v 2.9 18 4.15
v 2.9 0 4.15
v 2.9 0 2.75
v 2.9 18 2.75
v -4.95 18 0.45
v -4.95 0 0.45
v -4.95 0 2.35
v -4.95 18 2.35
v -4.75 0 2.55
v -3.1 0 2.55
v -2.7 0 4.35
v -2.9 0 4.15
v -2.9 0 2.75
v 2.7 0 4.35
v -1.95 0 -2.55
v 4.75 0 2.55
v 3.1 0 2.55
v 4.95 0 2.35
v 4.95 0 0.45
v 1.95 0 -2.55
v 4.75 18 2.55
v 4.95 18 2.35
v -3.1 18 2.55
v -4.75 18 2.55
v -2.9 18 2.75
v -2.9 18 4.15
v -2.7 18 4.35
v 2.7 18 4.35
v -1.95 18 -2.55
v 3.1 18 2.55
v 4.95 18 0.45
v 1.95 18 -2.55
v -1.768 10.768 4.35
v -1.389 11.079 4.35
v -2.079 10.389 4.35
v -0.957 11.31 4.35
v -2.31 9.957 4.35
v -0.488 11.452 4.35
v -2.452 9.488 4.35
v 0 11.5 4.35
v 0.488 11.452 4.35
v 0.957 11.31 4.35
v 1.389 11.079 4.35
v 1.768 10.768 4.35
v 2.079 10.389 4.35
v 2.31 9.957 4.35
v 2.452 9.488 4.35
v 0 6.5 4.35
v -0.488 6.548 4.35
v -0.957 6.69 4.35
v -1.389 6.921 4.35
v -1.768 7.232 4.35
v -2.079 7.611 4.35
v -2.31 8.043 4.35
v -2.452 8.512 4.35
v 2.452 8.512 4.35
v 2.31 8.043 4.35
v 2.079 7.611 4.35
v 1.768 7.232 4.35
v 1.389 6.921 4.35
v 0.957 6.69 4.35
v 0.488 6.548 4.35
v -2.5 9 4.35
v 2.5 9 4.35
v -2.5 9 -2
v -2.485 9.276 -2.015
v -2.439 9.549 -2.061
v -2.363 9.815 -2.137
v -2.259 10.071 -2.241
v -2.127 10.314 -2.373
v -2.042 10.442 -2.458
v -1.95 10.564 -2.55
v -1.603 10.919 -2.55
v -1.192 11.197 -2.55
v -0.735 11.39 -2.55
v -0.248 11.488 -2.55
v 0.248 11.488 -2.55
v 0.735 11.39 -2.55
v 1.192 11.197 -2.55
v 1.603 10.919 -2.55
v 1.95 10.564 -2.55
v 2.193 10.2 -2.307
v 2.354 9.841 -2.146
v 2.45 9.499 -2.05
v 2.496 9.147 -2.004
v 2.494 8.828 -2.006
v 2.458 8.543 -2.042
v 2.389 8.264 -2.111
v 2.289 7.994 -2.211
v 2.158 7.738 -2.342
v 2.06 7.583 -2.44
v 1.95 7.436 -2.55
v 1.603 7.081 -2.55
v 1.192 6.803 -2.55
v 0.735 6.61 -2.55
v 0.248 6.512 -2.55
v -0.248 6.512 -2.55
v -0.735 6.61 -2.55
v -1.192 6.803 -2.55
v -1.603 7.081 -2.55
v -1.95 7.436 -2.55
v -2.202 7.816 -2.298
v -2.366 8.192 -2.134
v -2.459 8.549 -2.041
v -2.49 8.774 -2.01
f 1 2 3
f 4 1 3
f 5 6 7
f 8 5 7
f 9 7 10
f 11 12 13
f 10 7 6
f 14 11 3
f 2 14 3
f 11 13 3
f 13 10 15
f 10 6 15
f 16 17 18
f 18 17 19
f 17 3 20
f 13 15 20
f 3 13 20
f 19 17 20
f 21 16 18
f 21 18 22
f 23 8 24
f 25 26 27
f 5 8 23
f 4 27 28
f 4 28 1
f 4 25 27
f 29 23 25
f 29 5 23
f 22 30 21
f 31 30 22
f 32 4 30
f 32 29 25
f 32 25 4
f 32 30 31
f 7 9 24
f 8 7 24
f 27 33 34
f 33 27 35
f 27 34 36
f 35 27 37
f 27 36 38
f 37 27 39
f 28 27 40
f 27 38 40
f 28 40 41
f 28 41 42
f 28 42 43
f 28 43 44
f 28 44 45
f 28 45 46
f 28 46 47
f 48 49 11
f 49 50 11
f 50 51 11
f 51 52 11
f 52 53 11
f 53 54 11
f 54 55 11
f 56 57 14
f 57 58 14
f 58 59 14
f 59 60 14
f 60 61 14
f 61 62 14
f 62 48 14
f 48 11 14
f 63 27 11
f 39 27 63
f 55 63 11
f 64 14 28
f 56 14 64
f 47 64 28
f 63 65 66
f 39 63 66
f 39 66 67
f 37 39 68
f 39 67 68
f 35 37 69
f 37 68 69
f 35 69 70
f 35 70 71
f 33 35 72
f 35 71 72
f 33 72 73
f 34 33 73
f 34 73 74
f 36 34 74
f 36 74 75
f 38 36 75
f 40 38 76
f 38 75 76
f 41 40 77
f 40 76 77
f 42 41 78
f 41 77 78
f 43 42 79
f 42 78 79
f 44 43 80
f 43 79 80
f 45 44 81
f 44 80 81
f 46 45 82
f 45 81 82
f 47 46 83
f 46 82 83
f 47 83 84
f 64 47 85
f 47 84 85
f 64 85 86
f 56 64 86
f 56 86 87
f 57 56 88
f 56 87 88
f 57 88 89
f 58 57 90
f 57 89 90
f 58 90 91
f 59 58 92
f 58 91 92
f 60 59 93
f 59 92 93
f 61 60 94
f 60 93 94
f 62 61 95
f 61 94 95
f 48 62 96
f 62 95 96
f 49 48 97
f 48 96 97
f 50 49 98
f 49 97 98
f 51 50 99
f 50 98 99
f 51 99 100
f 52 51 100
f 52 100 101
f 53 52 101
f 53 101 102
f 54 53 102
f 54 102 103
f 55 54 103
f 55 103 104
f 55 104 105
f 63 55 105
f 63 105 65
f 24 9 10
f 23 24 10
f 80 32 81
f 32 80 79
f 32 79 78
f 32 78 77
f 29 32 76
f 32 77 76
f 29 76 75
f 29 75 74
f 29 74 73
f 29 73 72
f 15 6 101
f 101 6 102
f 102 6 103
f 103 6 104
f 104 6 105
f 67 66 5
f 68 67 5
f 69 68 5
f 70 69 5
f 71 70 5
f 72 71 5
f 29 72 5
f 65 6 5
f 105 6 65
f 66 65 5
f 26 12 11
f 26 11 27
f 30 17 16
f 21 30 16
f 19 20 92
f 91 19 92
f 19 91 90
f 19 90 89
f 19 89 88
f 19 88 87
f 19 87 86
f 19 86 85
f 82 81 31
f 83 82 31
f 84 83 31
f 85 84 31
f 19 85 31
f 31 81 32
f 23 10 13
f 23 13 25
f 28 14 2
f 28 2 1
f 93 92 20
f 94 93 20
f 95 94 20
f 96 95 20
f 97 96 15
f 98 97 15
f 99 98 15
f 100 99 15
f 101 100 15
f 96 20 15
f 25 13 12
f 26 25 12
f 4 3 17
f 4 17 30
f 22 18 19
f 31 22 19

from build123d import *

# Parameters (mm, degrees)
EXTRUDE_1_DEPTH    = 18
CHAMFER_1_SIZE     = 3
CHAMFER_2_SIZE     = 0.2
HOLE_WIZARD_M6_1_D = 5


with BuildPart() as part:
    # 草图1 → 凸台-拉伸1 (new body)
    with BuildSketch(Plane(origin=(0, 0, 0), x_dir=(1, 0, 0), z_dir=(0, 1, 0))):
        Polygon((2.9, -2.55), (4.95, -2.55), (4.95, 2.55), (-4.95, 2.55), (-4.95, -2.55), (-2.9, -2.55), (-2.9, -4.35), (2.9, -4.35), align=None)
    extrude(amount=EXTRUDE_1_DEPTH)

    # 倒角1
    chamfer_1_edges = [part.edges().sort_by_distance(p)[0] for p in [
        (-4.95, 9, -2.55),
        (4.95, 9, -2.55),
    ]]
    chamfer(chamfer_1_edges, length=CHAMFER_1_SIZE)

    # 倒角2
    chamfer_2_edges = [part.edges().sort_by_distance(p)[0] for p in [
        (4.95, 9, 2.55),
        (2.9, 9, 2.55),
        (2.9, 9, 4.35),
        (-2.9, 9, 4.35),
        (-2.9, 9, 2.55),
        (-4.95, 9, 2.55),
    ]]
    chamfer(chamfer_2_edges, length=CHAMFER_2_SIZE)

    # M6 螺纹孔1 (through all)
    with Locations(Plane.XY.offset(4.35)):
        with Locations((0, 9)):
            Hole(HOLE_WIZARD_M6_1_D / 2)


solid = part.part
